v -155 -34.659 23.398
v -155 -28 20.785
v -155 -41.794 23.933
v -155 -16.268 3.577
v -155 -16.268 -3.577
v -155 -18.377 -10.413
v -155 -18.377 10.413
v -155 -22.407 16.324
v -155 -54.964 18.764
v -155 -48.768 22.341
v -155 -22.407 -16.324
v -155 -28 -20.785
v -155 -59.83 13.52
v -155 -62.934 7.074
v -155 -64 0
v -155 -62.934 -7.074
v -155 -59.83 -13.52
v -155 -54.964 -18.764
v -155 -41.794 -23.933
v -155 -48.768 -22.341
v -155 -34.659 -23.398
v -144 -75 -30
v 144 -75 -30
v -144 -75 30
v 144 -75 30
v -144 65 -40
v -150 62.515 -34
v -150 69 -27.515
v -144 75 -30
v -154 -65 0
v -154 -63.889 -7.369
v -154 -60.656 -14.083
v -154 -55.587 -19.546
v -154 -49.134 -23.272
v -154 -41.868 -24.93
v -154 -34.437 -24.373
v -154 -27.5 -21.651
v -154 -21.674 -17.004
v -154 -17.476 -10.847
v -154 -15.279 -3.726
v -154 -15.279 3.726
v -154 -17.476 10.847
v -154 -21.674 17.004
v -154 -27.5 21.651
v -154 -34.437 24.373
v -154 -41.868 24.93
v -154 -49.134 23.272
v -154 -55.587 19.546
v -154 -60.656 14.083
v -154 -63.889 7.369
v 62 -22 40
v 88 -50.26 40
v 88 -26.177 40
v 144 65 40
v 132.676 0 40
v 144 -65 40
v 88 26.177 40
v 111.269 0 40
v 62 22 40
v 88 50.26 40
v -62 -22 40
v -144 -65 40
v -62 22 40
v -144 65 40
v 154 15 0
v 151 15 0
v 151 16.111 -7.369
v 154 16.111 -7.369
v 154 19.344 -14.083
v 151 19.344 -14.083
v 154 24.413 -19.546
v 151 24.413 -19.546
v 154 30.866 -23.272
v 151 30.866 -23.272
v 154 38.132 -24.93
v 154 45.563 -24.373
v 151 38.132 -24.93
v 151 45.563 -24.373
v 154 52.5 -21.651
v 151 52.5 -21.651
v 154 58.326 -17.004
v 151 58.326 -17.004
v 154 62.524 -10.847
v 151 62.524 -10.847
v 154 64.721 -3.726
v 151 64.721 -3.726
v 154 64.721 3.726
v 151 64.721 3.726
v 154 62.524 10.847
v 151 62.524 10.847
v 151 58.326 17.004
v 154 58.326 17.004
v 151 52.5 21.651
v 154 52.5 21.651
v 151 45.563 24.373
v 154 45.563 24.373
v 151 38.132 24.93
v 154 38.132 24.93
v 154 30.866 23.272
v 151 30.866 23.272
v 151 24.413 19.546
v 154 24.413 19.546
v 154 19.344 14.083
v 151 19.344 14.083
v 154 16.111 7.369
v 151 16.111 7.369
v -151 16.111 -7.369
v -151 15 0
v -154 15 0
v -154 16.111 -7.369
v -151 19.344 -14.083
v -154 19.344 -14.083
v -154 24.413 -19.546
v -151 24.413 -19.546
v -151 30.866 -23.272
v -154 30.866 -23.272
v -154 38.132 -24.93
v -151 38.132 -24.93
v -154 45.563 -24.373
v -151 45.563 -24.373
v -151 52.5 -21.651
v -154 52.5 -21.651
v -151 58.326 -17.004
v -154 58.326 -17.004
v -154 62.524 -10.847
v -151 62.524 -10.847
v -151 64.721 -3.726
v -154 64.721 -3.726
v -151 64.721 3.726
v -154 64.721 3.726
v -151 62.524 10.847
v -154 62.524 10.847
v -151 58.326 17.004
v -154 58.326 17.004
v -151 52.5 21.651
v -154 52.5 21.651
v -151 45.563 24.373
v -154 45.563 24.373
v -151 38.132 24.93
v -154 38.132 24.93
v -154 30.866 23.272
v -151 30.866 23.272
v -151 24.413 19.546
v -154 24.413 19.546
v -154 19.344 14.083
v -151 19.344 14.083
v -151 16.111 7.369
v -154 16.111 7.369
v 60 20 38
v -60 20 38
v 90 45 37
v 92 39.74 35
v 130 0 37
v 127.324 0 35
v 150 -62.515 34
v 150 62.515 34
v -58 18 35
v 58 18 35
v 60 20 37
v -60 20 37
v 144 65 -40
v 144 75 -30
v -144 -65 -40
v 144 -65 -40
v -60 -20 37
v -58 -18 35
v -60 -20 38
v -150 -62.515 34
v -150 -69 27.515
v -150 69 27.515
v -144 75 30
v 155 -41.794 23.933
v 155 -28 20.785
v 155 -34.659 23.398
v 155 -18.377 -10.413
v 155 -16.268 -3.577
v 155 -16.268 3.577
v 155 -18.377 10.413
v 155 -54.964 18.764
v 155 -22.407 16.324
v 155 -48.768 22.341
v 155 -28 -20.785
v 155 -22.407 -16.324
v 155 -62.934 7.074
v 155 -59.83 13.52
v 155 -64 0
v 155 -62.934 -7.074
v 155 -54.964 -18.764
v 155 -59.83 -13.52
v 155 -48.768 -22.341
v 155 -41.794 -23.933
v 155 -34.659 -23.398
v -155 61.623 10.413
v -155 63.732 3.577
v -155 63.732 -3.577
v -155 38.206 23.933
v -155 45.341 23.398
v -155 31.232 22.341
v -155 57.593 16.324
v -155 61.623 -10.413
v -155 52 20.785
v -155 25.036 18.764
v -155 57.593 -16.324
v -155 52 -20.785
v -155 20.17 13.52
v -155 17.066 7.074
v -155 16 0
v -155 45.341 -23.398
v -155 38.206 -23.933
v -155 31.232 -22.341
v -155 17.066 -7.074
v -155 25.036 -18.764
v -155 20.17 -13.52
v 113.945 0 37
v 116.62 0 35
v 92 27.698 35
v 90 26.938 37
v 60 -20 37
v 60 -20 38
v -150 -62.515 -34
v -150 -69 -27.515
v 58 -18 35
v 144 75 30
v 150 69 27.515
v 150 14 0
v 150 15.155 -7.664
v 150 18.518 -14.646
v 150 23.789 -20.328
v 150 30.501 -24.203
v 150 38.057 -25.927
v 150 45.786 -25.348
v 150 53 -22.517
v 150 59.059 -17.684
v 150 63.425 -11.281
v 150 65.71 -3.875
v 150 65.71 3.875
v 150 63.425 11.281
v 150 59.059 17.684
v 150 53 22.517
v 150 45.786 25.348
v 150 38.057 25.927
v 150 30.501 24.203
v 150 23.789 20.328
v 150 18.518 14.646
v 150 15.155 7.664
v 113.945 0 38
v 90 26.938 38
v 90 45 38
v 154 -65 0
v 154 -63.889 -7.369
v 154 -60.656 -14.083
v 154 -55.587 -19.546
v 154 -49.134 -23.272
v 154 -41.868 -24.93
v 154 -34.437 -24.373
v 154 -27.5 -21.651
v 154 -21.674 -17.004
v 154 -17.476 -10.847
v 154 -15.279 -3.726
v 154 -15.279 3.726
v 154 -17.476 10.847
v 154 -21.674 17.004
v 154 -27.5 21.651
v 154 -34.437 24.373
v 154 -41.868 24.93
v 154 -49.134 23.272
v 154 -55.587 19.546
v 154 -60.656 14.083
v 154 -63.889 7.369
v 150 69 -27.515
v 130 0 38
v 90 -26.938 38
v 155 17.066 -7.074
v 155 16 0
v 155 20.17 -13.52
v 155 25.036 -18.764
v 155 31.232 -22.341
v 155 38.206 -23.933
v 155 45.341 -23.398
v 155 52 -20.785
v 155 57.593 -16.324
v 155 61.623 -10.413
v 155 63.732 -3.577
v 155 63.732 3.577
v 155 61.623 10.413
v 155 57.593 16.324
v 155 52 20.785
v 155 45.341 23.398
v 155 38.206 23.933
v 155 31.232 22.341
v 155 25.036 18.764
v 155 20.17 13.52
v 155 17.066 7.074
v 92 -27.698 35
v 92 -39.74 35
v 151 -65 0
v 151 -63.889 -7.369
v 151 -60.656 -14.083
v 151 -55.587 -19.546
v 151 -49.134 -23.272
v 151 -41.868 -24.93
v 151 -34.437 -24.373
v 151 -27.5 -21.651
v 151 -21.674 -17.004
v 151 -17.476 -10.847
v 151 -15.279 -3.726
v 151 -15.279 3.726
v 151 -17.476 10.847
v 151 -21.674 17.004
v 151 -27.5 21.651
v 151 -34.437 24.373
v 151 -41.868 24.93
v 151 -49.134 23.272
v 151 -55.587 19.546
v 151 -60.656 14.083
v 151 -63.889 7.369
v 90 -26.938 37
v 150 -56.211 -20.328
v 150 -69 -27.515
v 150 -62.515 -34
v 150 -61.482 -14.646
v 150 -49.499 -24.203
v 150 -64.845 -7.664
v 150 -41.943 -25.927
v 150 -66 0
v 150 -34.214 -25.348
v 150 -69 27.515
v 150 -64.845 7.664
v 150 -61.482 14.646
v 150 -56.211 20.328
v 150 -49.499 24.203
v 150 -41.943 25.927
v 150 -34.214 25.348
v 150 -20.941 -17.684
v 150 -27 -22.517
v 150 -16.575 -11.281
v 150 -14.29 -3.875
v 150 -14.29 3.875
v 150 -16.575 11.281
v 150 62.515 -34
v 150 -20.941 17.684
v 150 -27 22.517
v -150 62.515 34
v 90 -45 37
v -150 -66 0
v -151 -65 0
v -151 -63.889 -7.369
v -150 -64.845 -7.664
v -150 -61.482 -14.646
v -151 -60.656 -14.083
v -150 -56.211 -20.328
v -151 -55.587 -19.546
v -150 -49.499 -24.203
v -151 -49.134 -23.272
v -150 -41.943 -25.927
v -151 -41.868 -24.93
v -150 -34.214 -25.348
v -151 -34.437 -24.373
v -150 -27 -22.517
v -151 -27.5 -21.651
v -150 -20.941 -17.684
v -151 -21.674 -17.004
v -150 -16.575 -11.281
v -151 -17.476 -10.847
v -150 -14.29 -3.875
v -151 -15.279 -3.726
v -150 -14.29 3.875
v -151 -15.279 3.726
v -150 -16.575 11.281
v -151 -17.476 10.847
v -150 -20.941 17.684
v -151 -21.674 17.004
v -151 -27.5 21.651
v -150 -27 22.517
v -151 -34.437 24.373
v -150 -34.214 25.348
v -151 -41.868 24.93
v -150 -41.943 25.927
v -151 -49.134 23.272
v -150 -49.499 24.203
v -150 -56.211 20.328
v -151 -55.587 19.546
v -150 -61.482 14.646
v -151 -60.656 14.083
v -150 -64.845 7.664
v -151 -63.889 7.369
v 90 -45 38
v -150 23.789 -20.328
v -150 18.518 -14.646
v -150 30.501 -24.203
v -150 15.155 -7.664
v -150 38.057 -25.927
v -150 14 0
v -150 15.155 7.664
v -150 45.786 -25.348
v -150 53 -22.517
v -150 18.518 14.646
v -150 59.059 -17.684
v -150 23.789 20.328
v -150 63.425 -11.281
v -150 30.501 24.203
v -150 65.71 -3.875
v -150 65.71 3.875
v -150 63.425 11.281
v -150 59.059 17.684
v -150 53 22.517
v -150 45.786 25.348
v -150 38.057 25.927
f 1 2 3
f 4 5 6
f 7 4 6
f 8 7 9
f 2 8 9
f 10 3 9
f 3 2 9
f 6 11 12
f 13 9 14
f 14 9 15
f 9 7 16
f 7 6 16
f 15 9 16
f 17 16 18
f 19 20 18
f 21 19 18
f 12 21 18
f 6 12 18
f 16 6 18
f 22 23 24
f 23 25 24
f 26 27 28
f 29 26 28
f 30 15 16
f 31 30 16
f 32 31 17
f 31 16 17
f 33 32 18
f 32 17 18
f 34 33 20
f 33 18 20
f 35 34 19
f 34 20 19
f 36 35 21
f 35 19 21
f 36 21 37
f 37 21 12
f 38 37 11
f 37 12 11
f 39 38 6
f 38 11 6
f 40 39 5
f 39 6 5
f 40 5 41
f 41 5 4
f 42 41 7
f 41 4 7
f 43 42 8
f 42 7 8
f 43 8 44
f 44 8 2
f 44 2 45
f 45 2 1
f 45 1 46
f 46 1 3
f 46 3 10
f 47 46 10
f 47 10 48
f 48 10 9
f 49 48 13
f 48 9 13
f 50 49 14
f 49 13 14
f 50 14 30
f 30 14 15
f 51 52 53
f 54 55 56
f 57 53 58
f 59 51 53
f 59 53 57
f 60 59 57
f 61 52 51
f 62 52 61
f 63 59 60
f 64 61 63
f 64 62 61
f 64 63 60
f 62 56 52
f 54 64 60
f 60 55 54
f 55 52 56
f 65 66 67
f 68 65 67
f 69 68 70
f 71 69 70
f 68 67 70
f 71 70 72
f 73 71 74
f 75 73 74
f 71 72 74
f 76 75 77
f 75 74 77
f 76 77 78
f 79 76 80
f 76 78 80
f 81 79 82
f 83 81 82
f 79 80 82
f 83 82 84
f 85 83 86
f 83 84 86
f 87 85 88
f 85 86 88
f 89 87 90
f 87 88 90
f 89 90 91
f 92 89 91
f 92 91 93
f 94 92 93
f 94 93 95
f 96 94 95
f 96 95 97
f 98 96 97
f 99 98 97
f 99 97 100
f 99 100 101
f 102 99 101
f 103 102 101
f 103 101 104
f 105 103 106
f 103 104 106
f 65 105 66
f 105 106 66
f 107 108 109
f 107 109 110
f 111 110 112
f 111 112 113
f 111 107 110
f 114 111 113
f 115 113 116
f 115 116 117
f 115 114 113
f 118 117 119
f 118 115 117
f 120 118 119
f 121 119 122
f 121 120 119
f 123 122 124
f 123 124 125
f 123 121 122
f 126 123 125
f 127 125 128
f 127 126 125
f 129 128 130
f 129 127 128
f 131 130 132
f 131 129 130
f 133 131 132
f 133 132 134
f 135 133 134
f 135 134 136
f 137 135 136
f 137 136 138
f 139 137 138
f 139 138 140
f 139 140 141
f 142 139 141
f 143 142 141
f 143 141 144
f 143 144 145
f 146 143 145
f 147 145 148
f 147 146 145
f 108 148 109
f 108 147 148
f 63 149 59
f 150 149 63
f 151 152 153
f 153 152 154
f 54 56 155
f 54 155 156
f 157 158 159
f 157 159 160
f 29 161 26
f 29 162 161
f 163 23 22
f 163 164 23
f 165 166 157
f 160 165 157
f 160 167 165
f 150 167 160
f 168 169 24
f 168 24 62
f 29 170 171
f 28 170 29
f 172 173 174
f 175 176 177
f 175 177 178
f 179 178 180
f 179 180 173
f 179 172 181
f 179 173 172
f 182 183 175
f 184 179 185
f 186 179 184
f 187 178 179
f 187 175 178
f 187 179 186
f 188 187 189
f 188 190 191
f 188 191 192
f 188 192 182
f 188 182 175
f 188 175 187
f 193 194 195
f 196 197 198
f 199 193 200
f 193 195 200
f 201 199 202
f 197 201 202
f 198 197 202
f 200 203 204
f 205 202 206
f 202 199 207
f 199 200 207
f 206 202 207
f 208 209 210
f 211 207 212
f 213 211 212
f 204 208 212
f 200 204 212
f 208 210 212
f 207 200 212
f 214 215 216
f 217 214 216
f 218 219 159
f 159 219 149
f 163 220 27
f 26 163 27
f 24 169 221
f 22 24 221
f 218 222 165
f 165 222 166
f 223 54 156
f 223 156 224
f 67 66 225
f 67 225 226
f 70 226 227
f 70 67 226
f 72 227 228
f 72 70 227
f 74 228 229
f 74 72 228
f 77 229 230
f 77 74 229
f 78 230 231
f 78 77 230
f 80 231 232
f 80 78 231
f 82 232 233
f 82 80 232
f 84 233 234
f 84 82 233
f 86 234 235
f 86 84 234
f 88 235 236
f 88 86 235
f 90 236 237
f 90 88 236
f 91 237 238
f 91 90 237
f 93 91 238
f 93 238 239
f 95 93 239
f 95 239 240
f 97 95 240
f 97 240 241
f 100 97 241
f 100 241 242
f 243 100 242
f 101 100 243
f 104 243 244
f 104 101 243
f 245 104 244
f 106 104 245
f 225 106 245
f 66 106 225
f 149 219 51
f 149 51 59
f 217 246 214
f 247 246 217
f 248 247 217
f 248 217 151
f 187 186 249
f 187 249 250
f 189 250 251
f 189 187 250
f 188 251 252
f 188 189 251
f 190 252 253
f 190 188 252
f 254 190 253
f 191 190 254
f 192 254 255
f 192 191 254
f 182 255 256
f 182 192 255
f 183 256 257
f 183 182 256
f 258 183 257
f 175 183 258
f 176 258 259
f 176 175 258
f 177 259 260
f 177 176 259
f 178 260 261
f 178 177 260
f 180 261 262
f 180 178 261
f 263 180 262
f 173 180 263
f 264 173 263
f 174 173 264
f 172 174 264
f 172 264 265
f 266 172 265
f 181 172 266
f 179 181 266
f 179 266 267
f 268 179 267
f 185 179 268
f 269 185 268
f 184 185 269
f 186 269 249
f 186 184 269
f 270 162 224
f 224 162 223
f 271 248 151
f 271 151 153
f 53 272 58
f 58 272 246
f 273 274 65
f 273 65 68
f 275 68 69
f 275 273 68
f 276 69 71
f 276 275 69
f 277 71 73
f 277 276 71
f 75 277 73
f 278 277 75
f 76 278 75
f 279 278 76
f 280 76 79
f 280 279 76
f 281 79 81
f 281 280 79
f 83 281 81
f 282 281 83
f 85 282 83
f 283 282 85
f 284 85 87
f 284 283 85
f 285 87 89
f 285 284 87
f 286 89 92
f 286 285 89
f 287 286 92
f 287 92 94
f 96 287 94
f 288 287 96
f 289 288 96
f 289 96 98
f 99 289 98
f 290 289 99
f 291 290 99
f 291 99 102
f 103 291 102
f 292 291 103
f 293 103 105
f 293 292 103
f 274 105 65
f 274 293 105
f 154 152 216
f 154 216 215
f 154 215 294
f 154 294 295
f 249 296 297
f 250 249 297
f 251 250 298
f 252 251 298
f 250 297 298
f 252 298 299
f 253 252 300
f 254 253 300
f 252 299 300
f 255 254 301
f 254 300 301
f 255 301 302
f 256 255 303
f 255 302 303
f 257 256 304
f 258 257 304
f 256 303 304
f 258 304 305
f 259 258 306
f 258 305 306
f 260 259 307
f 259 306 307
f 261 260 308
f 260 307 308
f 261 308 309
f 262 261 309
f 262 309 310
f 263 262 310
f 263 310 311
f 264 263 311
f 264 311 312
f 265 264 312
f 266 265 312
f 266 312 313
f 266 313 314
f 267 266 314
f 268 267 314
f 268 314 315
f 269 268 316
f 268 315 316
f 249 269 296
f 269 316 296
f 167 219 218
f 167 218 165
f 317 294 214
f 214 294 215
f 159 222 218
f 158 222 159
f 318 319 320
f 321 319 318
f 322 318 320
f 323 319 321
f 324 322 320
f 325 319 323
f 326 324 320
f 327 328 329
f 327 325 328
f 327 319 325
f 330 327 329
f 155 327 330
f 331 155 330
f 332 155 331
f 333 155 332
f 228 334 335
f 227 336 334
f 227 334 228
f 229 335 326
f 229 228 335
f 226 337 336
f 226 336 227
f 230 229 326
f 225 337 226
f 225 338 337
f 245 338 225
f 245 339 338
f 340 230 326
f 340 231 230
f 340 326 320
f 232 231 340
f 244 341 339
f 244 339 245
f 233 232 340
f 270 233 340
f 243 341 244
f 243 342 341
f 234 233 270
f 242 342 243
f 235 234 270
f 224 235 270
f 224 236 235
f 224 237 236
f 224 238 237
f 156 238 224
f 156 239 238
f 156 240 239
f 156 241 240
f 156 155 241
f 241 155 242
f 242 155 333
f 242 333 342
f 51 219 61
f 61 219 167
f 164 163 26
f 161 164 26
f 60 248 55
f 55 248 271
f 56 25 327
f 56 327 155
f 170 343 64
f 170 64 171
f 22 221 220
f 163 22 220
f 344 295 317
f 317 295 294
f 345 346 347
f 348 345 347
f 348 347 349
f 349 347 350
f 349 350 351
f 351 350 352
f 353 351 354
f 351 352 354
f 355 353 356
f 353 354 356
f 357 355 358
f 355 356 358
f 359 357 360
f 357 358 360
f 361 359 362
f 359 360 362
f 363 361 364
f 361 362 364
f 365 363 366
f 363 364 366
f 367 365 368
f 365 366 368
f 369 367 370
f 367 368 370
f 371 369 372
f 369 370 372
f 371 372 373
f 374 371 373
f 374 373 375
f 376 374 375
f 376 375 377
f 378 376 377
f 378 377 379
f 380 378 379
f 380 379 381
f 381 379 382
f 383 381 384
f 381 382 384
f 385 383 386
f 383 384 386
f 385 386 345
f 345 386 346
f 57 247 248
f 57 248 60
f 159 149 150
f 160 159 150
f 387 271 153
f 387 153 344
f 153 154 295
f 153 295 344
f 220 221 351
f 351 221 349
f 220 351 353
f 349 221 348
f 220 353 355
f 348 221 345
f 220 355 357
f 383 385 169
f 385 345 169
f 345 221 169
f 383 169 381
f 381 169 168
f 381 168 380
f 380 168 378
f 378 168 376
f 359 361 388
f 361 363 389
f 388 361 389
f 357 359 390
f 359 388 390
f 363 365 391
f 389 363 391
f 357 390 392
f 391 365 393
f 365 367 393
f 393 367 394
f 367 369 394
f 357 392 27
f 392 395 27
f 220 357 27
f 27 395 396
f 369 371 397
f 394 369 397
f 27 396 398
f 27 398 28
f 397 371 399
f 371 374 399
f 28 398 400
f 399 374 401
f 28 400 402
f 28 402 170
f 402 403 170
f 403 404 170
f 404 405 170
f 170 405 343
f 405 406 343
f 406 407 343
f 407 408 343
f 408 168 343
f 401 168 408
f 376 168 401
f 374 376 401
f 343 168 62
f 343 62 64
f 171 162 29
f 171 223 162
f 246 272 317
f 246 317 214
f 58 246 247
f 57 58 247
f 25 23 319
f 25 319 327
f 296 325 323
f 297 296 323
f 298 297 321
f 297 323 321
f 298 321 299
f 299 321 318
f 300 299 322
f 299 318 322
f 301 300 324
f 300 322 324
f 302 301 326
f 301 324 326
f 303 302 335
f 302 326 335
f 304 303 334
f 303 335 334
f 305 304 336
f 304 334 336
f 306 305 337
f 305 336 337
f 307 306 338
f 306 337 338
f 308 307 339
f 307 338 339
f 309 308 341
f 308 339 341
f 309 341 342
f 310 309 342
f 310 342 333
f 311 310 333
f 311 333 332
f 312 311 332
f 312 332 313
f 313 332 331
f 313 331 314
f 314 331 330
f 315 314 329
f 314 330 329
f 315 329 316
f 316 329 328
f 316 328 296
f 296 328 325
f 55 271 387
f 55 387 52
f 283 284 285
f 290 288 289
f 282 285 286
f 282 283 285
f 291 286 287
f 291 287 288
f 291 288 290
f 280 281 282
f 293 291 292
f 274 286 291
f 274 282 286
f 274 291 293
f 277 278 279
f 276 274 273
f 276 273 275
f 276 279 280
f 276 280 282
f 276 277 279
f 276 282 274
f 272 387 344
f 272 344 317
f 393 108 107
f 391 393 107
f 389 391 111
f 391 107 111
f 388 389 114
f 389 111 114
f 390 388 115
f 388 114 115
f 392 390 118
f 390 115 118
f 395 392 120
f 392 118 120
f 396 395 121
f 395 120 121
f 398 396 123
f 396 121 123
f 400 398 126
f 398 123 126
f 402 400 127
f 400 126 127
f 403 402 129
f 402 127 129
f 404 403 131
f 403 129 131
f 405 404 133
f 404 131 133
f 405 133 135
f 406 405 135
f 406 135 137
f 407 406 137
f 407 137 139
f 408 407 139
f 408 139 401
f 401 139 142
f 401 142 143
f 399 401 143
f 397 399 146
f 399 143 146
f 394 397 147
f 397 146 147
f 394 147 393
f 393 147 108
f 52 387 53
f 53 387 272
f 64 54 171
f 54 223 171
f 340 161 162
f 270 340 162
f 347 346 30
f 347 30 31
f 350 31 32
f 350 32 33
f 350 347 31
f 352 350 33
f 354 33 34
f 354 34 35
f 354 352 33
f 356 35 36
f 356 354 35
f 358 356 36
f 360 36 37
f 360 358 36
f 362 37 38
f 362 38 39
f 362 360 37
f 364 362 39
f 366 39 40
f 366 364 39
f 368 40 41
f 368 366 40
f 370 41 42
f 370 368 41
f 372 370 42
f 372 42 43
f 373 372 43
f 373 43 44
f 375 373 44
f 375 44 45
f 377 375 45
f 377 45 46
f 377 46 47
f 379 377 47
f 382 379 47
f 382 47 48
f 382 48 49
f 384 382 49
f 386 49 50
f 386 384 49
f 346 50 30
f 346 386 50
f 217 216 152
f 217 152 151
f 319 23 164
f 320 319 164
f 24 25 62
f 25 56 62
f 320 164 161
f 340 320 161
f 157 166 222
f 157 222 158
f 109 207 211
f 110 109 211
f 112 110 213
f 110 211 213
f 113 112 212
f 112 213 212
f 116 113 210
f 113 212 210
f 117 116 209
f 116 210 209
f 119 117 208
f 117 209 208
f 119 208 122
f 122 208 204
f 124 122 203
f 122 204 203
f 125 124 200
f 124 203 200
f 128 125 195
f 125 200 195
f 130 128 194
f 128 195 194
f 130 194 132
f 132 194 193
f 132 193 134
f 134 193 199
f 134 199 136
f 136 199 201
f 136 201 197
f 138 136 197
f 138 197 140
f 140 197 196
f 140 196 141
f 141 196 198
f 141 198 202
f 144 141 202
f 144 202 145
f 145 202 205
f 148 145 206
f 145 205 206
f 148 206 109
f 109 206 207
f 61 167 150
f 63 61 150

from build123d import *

# Parameters (mm, degrees)
SKETCH1_W             = 150
SKETCH1_H             = 300
BOSS_EXTRUDE1_DEPTH   = 40
SKETCH2_R             = 25
BOSS_EXTRUDE2_DEPTH   = 5
SKETCH3_W             = 40
SKETCH3_H             = 120
CUT_EXTRUDE1_DEPTH    = 5
CUT_EXTRUDE2_DEPTH    = 5
CHAMFER2_SIZE         = 10
CHAMFER3_SIZE         = 2
CHAMFER4_SIZE         = 1
CHAMFER5_SIZE         = 1
CHAMFER6_SIZE         = 6
BODY_MOVE_COPY1_ANGLE = 120


with BuildPart() as part:
    # Sketch1 → Boss-Extrude1 (new, symmetric)
    with BuildSketch(Plane(origin=(0, 0, 0), x_dir=(1, 0, 0), z_dir=(0, 1, 0))):
        Rectangle(SKETCH1_W, SKETCH1_H)
    extrude(amount=BOSS_EXTRUDE1_DEPTH, both=True)

    # Sketch2 → Boss-Extrude2 (add)
    with BuildSketch(Plane.XY.offset(150)):
        with Locations(Location((-40, 0, 0), (0, 0, 180))):
            Circle(SKETCH2_R)
        with Locations(Location((40, 0, 0), (0, 0, 180))):
            Circle(SKETCH2_R)
    boss_extrude2 = extrude(amount=BOSS_EXTRUDE2_DEPTH)

    # Sketch3 → Cut-Extrude1 (cut)
    with BuildSketch(Plane(origin=(0, 40, 0), x_dir=(1, 0, 0), z_dir=(0, 1, 0))):
        Rectangle(SKETCH3_W, SKETCH3_H)
    extrude(amount=-CUT_EXTRUDE1_DEPTH, mode=Mode.SUBTRACT)

    # Sketch4 → Cut-Extrude2 (cut)
    with BuildSketch(Plane(origin=(0, 40, 0), x_dir=(1, 0, 0), z_dir=(0, 1, 0))):
        Polygon((0, -130), (-45, -90), (-26.937608132, -90), (0, -113.944540562), (26.937608132, -90), (45, -90), align=None)
    extrude(amount=-CUT_EXTRUDE2_DEPTH, mode=Mode.SUBTRACT)

    # Chamfer2
    chamfer2_edges = [part.edges().sort_by_distance(p)[0] for p in [
        (75, 40, 0),
        (-75, 40, 0),
        (75, -40, 0),
        (-75, -40, 0),
    ]]
    chamfer(chamfer2_edges, length=CHAMFER2_SIZE)

    # Chamfer3
    chamfer3_edges = [part.edges().sort_by_distance(p)[0] for p in [
        (-20, 35, 0),
        (0, 35, -60),
        (20, 35, 0),
        (0, 35, 60),
        (-20, 40, 0),
        (0, 40, 60),
        (20, 40, 0),
        (0, 40, -60),
        (22.5, 35, 110),
        (-22.5, 35, 110),
        (-35.968804066, 35, 90),
        (-13.468804066, 35, 101.972270281),
        (13.468804066, 35, 101.972270281),
        (35.968804066, 35, 90),
        (22.5, 40, 110),
        (35.968804066, 40, 90),
        (13.468804066, 40, 101.972270281),
        (-13.468804066, 40, 101.972270281),
        (-35.968804066, 40, 90),
        (-22.5, 40, 110),
    ]]
    chamfer(chamfer3_edges, length=CHAMFER3_SIZE)

    # Mirror1: Boss-Extrude2 across plane
    add(boss_extrude2.mirror(Plane.XY))

    # Chamfer4
    chamfer4_edges = [part.edges().sort_by_distance(p)[0] for p in [
        (-15, 0, -155),
        (65, 0, -155),
        (-15, 0, 155),
        (65, 0, 155),
    ]]
    chamfer(chamfer4_edges, length=CHAMFER4_SIZE)

    # Chamfer5
    chamfer5_edges = [part.edges().sort_by_distance(p)[0] for p in [
        (-15, 0, 150),
        (-15, 0, -150),
        (65, 0, -150),
        (65, 0, 150),
    ]]
    chamfer(chamfer5_edges, length=CHAMFER5_SIZE)

    # Chamfer6
    chamfer6_edges = [part.edges().sort_by_distance(p)[0] for p in [
        (75, 0, -150),
        (75, 0, 150),
        (0, -40, -150),
        (-75, 0, -150),
        (0, 40, -150),
        (-70, 35, -150),
        (70, 35, -150),
        (-70, -35, -150),
        (70, -35, -150),
        (0, -40, 150),
        (0, 40, 150),
        (-75, 0, 150),
        (-70, 35, 150),
        (70, 35, 150),
        (-70, -35, 150),
        (70, -35, 150),
    ]]
    chamfer(chamfer6_edges, length=CHAMFER6_SIZE)


with BuildPart() as part_1:
    # Body-Move/Copy1: moved
    add(part.part.rotate(Axis((0, 0, 0), (0.5773502691896252, 0.5773502691896252, 0.5773502691896272)), BODY_MOVE_COPY1_ANGLE))


solid = part_1.part
